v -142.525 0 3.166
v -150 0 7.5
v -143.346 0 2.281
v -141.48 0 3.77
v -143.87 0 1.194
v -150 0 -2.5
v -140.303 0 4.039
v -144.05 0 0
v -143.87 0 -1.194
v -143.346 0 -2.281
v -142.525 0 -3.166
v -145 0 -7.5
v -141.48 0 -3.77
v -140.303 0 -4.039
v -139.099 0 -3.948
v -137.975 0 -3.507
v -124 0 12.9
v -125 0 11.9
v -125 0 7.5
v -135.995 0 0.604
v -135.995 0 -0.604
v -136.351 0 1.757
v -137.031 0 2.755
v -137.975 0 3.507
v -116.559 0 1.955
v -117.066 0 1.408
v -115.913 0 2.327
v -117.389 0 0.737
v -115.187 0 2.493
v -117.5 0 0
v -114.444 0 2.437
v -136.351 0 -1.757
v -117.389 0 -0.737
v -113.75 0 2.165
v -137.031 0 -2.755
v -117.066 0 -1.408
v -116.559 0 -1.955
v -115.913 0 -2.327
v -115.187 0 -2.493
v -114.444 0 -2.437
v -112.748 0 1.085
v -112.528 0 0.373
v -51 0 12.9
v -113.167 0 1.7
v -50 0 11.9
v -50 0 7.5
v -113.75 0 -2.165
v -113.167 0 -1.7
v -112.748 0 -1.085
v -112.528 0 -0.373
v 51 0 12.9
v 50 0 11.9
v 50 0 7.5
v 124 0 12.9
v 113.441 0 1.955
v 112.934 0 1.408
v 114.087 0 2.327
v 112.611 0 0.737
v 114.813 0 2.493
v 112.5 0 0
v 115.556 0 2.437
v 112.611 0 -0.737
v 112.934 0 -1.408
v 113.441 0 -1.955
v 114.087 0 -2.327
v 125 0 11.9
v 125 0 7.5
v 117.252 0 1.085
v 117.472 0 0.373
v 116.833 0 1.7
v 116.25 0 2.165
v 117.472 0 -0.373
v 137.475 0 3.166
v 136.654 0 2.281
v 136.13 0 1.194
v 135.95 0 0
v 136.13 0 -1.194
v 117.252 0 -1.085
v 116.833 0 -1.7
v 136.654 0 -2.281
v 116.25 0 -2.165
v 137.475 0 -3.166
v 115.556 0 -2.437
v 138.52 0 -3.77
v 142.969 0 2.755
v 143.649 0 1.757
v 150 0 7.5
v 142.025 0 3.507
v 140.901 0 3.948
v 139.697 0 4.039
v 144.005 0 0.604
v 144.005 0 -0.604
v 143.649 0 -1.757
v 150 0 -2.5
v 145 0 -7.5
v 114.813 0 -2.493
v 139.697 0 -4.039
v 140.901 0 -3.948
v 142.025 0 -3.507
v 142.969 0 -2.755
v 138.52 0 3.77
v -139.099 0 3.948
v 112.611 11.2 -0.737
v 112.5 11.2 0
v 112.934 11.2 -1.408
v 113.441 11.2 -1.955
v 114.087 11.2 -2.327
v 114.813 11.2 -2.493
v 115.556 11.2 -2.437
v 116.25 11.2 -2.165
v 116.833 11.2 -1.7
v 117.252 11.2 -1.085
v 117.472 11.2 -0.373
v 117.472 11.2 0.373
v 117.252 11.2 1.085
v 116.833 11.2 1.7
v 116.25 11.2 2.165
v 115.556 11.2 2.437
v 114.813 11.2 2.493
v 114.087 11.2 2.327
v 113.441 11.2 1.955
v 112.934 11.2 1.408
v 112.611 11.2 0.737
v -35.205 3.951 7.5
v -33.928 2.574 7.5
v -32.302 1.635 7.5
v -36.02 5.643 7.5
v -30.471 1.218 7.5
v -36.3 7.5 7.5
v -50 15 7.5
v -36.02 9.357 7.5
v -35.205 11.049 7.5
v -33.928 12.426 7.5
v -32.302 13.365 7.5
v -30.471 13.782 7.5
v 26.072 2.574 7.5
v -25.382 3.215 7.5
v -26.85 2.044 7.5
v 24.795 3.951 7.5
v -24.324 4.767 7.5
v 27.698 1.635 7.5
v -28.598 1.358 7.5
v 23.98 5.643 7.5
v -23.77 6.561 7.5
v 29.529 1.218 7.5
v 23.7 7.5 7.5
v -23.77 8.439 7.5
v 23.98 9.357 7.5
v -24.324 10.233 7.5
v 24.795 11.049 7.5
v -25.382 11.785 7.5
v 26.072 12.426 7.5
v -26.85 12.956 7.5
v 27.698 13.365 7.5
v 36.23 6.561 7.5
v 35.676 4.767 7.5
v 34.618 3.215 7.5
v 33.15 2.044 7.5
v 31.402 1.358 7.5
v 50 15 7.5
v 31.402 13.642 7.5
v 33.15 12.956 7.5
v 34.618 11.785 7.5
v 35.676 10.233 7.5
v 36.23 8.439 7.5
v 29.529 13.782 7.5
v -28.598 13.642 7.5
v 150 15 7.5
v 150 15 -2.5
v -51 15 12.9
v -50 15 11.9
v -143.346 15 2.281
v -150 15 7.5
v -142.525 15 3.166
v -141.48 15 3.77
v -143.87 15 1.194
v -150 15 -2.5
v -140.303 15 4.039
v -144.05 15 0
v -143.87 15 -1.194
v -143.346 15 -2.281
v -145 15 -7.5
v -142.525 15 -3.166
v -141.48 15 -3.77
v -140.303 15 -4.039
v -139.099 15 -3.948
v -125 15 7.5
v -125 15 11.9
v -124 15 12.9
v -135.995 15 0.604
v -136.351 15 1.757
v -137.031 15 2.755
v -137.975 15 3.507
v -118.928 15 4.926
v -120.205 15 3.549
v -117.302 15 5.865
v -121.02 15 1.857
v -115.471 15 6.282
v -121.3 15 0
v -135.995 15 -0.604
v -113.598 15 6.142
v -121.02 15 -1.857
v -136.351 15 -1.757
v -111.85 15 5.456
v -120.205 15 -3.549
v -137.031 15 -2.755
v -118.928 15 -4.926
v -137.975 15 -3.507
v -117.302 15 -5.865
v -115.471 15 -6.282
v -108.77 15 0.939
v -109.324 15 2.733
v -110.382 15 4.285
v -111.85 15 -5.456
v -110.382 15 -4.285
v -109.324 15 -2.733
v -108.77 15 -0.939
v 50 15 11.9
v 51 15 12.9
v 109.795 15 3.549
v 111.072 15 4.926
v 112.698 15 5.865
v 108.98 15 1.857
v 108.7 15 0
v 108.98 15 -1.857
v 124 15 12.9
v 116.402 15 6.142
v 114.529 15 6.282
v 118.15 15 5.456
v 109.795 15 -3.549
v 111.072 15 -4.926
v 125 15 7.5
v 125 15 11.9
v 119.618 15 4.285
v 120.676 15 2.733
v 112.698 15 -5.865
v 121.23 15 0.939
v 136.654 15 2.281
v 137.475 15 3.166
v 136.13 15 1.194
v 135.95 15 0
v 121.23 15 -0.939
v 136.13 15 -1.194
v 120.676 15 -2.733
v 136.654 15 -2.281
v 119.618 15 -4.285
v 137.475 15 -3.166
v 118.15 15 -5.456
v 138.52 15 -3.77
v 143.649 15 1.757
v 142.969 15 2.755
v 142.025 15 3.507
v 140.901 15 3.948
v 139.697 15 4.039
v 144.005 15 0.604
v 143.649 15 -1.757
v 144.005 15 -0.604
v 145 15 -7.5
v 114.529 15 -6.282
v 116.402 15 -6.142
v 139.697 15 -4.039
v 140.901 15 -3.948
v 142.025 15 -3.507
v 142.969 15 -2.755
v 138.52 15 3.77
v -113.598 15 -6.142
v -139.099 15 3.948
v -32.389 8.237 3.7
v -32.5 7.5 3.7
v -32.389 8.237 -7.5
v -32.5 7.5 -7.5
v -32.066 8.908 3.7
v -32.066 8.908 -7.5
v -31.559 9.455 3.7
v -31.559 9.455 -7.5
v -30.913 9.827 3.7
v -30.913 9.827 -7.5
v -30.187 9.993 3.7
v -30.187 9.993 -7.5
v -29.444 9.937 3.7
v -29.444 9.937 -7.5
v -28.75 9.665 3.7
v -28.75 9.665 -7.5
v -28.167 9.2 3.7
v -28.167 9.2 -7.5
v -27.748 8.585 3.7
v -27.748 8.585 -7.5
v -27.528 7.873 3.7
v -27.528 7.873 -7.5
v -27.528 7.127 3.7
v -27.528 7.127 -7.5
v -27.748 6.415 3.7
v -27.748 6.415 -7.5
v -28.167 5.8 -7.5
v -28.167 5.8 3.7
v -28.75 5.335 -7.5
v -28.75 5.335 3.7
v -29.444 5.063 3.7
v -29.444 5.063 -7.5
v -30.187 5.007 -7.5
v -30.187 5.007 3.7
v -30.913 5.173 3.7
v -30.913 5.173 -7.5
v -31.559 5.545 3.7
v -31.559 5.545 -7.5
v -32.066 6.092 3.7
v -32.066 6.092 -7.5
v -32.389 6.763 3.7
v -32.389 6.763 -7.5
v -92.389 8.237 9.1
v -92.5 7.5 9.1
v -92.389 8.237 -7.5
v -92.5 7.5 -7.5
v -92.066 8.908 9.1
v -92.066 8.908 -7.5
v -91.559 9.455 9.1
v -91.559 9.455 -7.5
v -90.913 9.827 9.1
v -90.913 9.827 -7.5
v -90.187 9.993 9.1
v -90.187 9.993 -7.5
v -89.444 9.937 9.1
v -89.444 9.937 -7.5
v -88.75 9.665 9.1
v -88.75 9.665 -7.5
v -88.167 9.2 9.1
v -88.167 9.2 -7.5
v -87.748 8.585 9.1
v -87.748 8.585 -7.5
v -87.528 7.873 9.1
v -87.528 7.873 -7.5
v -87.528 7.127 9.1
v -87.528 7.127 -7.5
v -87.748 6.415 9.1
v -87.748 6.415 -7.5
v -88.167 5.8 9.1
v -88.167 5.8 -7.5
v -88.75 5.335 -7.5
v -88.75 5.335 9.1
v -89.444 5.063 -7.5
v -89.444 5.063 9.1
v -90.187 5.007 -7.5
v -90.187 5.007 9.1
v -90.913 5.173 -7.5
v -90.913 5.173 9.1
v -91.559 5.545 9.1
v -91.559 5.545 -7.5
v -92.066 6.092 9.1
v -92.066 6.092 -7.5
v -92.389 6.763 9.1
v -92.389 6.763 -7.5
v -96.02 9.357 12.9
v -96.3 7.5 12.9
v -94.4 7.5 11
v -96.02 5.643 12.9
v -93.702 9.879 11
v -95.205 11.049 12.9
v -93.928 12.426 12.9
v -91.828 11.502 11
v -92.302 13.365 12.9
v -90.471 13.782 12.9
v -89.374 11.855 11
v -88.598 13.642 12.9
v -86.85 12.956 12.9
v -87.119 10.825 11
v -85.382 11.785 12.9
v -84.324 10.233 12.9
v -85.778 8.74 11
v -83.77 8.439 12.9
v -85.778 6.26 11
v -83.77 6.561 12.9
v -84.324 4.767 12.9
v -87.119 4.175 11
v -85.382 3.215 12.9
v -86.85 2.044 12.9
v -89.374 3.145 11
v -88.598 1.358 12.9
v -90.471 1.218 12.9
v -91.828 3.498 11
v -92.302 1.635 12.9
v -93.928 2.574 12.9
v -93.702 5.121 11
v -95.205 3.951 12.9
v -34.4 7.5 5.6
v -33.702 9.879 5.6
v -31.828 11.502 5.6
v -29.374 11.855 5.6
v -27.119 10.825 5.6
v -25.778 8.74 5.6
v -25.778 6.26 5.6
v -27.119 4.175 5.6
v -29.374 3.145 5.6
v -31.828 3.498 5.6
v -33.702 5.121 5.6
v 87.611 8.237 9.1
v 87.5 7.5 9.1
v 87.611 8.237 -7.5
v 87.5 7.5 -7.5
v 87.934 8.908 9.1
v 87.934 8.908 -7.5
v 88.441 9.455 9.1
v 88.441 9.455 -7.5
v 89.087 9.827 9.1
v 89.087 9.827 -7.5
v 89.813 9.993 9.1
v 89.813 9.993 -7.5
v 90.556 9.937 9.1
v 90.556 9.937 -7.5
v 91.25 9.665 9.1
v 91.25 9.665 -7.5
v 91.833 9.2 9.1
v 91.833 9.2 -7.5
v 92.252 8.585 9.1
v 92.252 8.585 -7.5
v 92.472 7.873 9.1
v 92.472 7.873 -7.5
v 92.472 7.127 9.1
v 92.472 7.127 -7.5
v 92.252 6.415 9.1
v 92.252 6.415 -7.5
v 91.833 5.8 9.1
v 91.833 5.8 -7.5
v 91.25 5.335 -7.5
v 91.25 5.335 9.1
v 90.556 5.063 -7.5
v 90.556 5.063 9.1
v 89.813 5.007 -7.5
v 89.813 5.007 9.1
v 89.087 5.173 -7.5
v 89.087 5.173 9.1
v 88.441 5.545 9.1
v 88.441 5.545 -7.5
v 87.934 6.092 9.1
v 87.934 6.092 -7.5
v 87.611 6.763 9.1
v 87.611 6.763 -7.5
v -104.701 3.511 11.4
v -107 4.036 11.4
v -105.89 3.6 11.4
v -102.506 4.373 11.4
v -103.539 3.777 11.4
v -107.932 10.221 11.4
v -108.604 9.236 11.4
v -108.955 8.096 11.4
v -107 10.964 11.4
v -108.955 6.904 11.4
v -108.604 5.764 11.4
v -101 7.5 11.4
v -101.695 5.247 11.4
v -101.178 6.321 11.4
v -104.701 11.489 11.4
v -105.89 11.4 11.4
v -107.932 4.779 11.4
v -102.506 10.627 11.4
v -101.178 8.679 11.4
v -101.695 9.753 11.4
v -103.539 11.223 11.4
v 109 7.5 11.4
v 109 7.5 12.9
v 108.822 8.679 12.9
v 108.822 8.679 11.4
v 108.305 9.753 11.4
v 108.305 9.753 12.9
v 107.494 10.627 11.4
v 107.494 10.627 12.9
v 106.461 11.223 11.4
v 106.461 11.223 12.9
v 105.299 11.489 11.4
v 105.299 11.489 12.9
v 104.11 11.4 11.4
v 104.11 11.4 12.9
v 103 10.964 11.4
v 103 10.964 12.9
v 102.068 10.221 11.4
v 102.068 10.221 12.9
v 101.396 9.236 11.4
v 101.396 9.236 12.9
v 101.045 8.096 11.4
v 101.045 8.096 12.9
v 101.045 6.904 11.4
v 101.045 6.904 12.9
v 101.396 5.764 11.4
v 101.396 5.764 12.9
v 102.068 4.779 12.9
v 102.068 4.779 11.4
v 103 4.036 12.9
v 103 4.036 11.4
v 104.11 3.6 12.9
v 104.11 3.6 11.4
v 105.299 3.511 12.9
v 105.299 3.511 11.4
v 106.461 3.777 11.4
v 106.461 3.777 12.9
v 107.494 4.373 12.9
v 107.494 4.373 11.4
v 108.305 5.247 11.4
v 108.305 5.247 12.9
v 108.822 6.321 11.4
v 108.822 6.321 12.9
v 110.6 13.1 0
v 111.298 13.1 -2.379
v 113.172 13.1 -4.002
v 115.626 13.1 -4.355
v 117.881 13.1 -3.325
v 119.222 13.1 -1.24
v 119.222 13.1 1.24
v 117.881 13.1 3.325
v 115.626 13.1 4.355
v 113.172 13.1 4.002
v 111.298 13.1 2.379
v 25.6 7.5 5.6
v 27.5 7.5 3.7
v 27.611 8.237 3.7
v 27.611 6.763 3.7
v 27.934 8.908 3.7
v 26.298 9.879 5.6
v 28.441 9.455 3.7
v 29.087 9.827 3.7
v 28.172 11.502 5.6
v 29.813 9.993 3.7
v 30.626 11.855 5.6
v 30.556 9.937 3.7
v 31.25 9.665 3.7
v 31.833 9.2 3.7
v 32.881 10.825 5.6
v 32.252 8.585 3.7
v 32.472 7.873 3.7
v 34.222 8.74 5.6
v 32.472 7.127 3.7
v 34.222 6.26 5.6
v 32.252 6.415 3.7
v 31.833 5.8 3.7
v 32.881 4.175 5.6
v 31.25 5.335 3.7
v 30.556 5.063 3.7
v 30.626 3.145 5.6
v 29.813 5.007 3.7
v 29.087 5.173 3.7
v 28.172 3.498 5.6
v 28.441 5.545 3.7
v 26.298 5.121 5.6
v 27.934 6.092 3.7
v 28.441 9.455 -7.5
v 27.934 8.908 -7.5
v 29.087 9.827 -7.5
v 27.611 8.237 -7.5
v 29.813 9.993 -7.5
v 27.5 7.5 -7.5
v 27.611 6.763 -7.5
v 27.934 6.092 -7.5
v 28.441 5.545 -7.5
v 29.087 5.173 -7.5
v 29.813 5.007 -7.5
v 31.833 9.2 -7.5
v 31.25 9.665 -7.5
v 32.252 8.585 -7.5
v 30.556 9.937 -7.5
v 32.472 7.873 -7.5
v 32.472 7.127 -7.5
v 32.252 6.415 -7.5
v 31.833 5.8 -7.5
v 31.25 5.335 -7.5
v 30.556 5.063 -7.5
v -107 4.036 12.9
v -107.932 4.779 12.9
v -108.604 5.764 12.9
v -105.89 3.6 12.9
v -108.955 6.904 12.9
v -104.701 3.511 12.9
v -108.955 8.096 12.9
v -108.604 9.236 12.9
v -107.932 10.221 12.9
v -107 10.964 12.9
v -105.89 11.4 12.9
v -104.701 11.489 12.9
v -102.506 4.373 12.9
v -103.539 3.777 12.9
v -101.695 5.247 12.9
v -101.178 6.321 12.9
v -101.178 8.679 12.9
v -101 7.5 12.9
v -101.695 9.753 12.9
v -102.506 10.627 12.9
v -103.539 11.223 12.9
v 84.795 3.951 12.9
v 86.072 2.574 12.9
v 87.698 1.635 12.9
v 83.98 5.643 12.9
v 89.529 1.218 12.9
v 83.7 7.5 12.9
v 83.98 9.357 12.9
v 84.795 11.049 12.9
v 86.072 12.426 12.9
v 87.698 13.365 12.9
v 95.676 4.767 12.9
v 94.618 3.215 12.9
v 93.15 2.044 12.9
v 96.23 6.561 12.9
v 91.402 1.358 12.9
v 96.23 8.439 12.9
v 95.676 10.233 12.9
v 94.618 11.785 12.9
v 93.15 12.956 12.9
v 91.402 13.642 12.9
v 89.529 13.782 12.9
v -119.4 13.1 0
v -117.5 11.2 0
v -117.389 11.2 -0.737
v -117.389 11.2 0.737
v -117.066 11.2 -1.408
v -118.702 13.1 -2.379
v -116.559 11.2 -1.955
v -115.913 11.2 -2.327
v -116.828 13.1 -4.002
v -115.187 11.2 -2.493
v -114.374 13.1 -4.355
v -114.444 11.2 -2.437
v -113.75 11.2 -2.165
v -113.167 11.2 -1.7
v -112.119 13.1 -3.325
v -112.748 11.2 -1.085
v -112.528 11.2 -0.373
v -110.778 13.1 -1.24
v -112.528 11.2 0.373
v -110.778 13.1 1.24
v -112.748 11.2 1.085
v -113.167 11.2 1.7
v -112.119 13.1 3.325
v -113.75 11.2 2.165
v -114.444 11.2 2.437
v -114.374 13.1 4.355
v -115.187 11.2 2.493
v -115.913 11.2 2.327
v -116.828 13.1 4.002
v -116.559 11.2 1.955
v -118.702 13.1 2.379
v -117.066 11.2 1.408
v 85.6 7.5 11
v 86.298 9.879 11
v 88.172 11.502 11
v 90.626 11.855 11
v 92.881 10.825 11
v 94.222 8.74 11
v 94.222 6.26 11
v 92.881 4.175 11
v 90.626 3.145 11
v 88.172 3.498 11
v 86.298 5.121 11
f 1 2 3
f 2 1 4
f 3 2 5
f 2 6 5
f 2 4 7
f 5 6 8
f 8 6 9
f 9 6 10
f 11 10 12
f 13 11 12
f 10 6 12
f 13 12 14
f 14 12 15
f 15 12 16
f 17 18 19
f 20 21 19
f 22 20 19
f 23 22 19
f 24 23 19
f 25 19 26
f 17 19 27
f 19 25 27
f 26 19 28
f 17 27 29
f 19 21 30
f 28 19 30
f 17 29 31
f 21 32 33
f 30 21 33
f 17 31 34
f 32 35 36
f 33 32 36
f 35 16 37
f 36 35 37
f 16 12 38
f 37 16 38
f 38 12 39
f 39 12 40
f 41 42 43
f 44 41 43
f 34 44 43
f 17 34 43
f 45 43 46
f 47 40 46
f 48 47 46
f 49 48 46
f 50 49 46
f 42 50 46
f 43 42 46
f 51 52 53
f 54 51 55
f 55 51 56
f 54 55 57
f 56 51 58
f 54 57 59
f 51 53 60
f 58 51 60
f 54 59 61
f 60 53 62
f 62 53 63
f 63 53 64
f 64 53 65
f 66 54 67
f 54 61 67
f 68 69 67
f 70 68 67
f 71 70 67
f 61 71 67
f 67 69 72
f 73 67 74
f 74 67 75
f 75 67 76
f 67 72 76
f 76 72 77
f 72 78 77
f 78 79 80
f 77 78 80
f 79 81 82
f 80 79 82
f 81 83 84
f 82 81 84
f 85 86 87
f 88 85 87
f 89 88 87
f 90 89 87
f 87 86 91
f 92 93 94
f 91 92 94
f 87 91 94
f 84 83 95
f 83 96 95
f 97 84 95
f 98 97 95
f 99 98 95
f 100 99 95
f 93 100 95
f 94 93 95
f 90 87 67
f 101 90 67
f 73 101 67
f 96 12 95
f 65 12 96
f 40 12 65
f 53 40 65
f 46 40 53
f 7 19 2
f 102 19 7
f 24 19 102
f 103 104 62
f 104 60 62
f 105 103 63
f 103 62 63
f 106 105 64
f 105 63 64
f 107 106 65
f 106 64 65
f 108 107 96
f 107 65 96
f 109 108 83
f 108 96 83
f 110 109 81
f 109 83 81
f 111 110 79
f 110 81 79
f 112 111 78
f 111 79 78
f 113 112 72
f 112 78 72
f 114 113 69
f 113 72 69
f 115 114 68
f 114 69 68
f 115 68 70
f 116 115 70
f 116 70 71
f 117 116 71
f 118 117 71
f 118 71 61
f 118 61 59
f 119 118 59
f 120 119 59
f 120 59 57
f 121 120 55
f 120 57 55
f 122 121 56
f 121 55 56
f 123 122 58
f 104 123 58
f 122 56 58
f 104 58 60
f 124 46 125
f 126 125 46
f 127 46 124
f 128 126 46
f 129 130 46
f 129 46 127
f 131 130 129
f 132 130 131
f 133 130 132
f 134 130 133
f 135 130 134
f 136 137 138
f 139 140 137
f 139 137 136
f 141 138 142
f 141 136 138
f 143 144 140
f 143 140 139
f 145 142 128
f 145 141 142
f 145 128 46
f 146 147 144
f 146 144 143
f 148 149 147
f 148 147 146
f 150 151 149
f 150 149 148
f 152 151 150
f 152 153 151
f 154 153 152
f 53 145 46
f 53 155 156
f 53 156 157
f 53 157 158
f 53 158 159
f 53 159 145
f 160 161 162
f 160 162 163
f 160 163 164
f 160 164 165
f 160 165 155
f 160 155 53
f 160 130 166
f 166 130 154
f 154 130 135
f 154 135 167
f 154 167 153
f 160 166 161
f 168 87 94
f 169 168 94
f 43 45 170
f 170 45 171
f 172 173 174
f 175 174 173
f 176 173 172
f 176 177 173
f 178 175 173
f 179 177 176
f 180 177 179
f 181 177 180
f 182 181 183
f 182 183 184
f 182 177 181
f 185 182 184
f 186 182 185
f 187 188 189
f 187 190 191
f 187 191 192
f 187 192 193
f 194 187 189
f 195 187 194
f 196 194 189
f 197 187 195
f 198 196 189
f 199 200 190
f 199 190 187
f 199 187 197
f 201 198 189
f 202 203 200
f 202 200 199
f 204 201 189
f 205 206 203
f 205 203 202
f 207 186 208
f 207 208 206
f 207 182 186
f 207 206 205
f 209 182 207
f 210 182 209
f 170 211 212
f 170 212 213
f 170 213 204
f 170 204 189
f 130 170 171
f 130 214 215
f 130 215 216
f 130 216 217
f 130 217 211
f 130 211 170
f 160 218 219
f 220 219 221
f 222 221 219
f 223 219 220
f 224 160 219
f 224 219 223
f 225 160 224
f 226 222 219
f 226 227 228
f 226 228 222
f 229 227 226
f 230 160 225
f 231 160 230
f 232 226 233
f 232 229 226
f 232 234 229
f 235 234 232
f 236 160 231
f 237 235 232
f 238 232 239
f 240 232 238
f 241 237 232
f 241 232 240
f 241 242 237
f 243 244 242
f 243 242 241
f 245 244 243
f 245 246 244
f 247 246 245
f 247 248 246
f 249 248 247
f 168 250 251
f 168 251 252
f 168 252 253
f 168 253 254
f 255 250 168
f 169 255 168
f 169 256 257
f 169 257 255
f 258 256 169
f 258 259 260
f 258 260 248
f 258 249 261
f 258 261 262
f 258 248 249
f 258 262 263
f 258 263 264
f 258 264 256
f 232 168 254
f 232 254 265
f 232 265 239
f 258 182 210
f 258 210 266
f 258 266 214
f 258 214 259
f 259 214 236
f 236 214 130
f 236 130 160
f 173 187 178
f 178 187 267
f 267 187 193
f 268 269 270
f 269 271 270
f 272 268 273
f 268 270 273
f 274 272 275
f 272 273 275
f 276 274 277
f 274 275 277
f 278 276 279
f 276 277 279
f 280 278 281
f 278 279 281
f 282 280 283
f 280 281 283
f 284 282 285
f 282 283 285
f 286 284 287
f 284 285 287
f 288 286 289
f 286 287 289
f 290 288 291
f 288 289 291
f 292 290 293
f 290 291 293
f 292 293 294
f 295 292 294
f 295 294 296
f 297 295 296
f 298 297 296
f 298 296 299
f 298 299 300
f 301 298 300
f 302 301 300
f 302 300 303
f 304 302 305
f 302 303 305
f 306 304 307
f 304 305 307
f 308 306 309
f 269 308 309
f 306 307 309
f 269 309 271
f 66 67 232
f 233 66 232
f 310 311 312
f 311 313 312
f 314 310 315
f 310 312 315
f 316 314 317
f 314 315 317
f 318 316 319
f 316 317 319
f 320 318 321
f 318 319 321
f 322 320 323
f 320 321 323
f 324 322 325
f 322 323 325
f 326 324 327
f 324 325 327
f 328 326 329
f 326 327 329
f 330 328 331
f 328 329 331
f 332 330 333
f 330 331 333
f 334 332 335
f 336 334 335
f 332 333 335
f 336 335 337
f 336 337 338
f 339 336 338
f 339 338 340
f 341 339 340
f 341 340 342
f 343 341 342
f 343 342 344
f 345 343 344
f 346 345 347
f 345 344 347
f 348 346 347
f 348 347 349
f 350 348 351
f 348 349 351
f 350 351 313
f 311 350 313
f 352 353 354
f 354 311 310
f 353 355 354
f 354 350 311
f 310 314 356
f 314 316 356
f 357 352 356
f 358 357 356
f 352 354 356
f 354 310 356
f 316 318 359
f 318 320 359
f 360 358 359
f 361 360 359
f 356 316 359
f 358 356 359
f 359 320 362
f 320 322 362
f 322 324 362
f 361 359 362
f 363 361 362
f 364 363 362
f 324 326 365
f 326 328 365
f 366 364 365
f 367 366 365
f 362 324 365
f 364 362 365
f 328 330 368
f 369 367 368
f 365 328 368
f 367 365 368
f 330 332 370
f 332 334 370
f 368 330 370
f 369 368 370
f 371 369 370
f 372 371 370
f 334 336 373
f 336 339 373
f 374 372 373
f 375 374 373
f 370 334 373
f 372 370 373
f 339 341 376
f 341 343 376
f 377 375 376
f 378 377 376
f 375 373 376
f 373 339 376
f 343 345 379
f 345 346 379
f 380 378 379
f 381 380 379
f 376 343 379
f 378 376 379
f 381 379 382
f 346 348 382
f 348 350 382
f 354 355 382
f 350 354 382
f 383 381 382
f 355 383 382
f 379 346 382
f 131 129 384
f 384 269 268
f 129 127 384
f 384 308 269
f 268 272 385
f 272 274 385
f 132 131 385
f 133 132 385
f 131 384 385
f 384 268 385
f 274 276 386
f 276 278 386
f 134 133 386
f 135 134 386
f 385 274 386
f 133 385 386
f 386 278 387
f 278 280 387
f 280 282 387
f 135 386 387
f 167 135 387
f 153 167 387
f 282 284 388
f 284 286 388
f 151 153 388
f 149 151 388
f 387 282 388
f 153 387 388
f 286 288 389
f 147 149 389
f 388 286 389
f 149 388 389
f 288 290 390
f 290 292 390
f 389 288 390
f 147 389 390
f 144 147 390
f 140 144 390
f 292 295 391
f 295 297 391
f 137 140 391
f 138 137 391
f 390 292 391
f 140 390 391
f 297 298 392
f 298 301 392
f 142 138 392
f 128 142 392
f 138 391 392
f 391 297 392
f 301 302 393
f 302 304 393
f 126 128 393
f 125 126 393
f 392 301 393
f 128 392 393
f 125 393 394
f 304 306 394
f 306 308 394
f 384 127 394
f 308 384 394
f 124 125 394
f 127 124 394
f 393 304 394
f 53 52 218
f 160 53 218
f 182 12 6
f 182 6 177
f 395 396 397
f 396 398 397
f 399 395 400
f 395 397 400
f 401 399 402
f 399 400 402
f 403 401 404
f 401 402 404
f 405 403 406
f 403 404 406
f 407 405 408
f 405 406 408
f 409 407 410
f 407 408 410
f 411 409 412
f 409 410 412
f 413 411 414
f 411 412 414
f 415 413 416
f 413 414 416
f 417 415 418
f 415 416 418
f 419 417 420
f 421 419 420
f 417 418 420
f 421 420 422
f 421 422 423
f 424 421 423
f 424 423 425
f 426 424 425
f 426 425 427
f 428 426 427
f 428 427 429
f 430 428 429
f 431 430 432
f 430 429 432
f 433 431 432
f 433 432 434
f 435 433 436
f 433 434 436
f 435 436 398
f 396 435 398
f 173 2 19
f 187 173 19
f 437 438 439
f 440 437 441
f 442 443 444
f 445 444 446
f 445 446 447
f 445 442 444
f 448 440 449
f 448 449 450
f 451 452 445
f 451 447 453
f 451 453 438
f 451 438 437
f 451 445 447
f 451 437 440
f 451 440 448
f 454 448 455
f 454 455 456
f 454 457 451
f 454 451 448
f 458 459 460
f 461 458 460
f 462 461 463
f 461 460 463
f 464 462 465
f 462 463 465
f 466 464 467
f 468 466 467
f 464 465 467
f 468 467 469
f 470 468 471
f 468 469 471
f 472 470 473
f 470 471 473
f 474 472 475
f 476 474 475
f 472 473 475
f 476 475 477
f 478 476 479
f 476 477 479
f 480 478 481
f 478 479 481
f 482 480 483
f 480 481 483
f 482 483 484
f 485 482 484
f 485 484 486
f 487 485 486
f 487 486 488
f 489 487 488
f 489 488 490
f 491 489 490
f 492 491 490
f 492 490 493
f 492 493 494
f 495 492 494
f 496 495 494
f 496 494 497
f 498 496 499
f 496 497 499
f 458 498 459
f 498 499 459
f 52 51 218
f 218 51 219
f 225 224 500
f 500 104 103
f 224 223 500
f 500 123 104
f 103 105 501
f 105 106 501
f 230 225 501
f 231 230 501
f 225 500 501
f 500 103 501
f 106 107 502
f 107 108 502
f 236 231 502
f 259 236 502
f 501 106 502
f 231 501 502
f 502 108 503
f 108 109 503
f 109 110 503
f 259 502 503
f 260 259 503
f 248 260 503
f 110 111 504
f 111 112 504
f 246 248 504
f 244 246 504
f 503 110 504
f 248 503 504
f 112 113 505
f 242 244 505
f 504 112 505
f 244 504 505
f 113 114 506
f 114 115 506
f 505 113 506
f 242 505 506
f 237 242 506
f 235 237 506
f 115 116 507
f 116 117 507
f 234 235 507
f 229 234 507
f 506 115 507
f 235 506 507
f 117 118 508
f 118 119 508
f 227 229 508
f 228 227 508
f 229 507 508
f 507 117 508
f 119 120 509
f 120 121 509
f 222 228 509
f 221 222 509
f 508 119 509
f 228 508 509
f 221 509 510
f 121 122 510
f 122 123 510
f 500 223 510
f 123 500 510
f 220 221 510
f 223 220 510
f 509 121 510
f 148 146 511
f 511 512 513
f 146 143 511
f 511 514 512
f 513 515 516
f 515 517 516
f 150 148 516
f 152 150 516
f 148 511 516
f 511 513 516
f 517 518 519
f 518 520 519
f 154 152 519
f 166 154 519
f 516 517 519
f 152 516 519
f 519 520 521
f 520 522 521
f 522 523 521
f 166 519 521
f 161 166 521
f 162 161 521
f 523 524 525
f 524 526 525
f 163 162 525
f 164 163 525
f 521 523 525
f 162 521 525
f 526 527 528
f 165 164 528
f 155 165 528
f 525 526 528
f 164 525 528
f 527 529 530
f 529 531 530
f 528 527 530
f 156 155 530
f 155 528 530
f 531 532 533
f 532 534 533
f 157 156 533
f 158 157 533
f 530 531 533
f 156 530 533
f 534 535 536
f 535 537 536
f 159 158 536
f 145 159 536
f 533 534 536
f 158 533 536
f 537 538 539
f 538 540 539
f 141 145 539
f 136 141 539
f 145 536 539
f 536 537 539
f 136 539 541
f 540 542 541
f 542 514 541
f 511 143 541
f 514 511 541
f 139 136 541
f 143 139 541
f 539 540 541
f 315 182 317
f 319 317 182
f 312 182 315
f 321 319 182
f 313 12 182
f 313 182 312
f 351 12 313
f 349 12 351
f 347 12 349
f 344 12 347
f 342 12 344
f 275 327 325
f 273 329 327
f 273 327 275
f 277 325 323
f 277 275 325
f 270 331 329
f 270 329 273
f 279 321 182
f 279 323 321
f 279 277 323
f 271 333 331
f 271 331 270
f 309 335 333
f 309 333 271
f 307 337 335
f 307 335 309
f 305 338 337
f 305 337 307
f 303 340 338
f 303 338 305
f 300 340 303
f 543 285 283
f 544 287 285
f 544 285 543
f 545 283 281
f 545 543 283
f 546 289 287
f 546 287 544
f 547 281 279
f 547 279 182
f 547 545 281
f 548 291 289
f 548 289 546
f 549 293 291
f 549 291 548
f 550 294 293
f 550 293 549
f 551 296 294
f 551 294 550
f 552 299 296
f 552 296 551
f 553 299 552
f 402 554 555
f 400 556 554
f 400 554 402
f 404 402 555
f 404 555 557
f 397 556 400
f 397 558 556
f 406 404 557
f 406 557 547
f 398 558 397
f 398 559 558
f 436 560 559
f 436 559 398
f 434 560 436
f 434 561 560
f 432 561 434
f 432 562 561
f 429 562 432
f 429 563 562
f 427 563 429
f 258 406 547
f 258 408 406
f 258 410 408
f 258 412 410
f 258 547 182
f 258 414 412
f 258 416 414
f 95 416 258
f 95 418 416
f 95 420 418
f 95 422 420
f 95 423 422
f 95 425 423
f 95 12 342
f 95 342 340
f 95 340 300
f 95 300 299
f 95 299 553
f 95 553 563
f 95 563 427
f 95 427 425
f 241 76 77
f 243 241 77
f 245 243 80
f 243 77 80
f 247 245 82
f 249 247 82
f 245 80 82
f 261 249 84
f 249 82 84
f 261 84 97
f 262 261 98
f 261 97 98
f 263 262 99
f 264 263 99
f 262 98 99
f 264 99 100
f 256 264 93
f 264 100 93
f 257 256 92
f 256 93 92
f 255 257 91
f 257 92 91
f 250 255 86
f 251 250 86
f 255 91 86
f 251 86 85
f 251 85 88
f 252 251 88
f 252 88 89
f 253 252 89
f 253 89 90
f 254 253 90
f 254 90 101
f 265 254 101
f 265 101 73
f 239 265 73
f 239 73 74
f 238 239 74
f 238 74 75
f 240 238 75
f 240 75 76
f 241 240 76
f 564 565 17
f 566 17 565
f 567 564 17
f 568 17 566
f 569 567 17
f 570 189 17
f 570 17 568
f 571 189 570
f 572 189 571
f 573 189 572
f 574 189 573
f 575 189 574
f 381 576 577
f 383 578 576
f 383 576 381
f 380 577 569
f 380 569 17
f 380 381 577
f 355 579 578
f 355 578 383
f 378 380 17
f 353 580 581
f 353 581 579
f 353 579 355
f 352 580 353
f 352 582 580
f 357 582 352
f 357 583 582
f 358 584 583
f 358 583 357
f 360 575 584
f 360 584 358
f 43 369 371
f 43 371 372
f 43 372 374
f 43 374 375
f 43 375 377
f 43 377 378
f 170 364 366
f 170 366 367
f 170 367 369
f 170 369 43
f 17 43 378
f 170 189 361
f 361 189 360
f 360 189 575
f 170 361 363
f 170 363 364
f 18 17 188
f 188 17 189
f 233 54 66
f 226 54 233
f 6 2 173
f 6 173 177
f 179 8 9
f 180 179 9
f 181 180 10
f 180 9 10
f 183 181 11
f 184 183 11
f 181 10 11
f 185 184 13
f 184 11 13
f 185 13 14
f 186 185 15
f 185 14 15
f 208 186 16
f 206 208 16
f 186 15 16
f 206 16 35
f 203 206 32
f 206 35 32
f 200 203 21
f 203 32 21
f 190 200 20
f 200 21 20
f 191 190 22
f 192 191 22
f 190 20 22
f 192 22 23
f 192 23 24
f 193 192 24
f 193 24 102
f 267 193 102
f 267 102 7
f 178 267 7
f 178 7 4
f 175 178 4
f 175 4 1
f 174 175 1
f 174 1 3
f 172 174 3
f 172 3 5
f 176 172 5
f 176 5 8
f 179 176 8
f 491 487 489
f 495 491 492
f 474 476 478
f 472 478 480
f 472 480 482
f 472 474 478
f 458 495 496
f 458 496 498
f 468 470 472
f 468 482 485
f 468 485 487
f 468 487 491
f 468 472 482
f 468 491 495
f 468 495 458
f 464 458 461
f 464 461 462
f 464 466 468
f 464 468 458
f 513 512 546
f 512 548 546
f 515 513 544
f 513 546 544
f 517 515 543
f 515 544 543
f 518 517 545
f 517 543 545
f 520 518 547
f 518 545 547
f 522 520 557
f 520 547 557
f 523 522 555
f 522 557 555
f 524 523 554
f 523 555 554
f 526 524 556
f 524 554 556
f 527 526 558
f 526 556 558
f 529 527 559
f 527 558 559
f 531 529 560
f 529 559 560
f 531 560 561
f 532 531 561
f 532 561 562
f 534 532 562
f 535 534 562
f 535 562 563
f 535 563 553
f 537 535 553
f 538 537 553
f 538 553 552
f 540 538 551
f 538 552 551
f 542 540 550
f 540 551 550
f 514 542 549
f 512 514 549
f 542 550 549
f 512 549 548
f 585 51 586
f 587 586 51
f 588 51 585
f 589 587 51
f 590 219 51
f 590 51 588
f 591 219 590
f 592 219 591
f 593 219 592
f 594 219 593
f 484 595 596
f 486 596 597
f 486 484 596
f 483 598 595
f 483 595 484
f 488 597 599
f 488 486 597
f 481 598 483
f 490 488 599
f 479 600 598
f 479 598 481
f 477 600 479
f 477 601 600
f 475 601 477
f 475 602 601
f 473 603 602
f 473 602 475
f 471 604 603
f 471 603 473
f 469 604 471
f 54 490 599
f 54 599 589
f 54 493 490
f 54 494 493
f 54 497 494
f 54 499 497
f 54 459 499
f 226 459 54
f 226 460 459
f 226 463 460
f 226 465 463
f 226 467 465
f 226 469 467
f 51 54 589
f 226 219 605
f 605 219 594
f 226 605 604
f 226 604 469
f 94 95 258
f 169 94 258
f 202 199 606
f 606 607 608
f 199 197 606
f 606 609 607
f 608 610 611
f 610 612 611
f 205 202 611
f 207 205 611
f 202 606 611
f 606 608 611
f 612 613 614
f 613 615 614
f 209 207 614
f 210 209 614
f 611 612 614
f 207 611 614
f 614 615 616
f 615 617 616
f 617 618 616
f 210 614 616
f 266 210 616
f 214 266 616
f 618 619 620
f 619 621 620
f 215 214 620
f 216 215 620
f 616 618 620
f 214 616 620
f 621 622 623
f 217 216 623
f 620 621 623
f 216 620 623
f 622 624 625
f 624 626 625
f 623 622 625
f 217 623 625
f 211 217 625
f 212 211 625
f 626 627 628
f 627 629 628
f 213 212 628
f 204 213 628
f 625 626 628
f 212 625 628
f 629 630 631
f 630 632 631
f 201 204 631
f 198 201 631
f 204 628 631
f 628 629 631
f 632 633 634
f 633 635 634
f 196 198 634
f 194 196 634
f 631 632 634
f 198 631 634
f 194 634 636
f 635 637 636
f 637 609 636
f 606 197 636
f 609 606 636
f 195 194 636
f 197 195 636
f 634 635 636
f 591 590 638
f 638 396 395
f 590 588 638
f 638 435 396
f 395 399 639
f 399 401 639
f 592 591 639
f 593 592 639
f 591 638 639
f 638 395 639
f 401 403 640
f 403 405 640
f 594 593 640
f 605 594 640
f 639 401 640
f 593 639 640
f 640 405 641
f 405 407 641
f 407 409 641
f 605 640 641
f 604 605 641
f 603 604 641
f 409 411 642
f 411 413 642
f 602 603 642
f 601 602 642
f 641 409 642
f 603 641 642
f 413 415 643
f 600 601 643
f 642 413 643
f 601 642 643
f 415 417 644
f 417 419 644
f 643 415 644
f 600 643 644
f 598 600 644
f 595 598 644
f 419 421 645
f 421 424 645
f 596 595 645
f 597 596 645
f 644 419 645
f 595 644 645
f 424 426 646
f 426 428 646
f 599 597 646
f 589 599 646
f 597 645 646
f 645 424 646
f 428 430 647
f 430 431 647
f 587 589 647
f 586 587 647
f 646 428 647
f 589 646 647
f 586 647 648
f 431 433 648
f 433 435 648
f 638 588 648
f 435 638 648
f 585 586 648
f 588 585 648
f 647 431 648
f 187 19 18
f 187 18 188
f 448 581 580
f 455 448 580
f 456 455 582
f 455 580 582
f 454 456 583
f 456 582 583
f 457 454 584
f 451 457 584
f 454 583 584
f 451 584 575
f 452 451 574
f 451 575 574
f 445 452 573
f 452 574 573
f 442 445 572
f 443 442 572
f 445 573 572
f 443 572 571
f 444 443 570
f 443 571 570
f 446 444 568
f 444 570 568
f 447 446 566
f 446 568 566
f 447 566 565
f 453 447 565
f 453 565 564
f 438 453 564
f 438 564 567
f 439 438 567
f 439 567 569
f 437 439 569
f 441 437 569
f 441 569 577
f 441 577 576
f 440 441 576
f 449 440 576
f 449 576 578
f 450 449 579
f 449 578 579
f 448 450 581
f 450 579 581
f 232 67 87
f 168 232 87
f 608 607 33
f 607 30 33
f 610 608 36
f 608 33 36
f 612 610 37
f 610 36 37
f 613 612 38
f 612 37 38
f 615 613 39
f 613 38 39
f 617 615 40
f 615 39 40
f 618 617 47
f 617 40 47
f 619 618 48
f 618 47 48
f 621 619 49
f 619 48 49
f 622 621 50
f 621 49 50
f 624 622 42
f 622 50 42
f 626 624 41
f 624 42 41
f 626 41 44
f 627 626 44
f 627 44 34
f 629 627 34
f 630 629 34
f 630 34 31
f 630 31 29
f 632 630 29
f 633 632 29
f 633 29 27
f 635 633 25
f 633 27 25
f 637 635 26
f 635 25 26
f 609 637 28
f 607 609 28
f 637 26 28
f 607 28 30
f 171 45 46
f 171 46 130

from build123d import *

# Parameters (mm, degrees)
SKETCH_1_W                   = 300
SKETCH_1_H                   = 15
EXTRUDE_328_DEPTH            = 15
HOLE_WIZARD_M6_D             = 5
HOLE_WIZARD_M6_CSINK_D       = 12.6
HOLE_WIZARD_M6_CSINK_ANGLE   = 90
HOLE_WIZARD_8_1_D            = 8.1
SKETCH_8_W                   = 250
SKETCH_8_H                   = 15
EXTRUDE_2374_DEPTH           = 5.4
SKETCH_9_R                   = 4
CUT_EXTRUDE_2694_DEPTH       = 1.5
SKETCH_10_W                  = 100
SKETCH_10_H                  = 15
CUT_EXTRUDE_2982_DEPTH       = 5.4
HOLE_WIZARD_1_M6_D           = 5
HOLE_WIZARD_1_M6_CSINK_D     = 12.6
HOLE_WIZARD_1_M6_CSINK_ANGLE = 90
HOLE_WIZARD_2_M6_D           = 5
HOLE_WIZARD_2_M6_CSINK_D     = 12.6
HOLE_WIZARD_2_M6_CSINK_ANGLE = 90
CHAMFER_1_SIZE               = 5
CHAMFER_2_SIZE               = 1


with BuildPart() as part:
    # Эскиз1 → Extrude 328 (new body)
    with BuildSketch(Plane(origin=(0, 0, 0), x_dir=(1, 0, 0), z_dir=(0, 1, 0))):
        Rectangle(SKETCH_1_W, SKETCH_1_H)
    extrude(amount=EXTRUDE_328_DEPTH)

    # Крепление шарнира M6 (through all)
    with Locations(Plane(origin=(0, 15, 0), x_dir=(1, 0, 0), z_dir=(0, 1, 0))):
        with Locations((-115, 0), (115, 0)):
            CounterSinkHole(HOLE_WIZARD_M6_D / 2, HOLE_WIZARD_M6_CSINK_D / 2, counter_sink_angle=HOLE_WIZARD_M6_CSINK_ANGLE)

    # Отверстие-8.1мм (through all)
    with Locations(Plane(origin=(0, 15, 0), x_dir=(1, 0, 0), z_dir=(0, 1, 0))):
        with Locations((-140, 0), (140, 0)):
            Hole(HOLE_WIZARD_8_1_D / 2)

    # Эскиз8 → Extrude 2374 (add)
    with BuildSketch(Plane.XY.offset(7.5)):
        with Locations((0, 7.5)):
            Rectangle(SKETCH_8_W, SKETCH_8_H)
    extrude(amount=EXTRUDE_2374_DEPTH)

    # Эскиз9 → Cut-Extrude 2694 (cut)
    with BuildSketch(Plane.XY.offset(12.9)):
        with Locations((-105, 7.5)):
            Circle(SKETCH_9_R)
        with Locations((105, 7.5)):
            Circle(SKETCH_9_R)
    extrude(amount=-CUT_EXTRUDE_2694_DEPTH, mode=Mode.SUBTRACT)

    # Эскиз10 → Cut-Extrude 2982 (cut)
    with BuildSketch(Plane.XY.offset(12.9)):
        with Locations((0, 7.5)):
            Rectangle(SKETCH_10_W, SKETCH_10_H)
    extrude(amount=-CUT_EXTRUDE_2982_DEPTH, mode=Mode.SUBTRACT)

    # Прижим-1-M6 (through all)
    with Locations(Plane.XY.offset(12.9)):
        with Locations((-90, 7.5), (90, 7.5)):
            CounterSinkHole(HOLE_WIZARD_1_M6_D / 2, HOLE_WIZARD_1_M6_CSINK_D / 2, counter_sink_angle=HOLE_WIZARD_1_M6_CSINK_ANGLE)

    # Прижим-2-M6 (through all)
    with Locations(Plane.XY.offset(7.5)):
        with Locations((-30, 7.5), (30, 7.5)):
            CounterSinkHole(HOLE_WIZARD_2_M6_D / 2, HOLE_WIZARD_2_M6_CSINK_D / 2, counter_sink_angle=HOLE_WIZARD_2_M6_CSINK_ANGLE)

    # Фаска1
    chamfer_1_edges = [part.edges().sort_by_distance(p)[0] for p in [
        (-150, 7.5, -7.5),
        (150, 7.5, -7.5),
    ]]
    chamfer(chamfer_1_edges, length=CHAMFER_1_SIZE)

    # Фаска2
    chamfer_2_edges = [part.edges().sort_by_distance(p)[0] for p in [
        (-125, 7.5, 12.9),
        (125, 7.5, 12.9),
        (-50, 7.5, 12.9),
        (50, 7.5, 12.9),
    ]]
    chamfer(chamfer_2_edges, length=CHAMFER_2_SIZE)


solid = part.part
